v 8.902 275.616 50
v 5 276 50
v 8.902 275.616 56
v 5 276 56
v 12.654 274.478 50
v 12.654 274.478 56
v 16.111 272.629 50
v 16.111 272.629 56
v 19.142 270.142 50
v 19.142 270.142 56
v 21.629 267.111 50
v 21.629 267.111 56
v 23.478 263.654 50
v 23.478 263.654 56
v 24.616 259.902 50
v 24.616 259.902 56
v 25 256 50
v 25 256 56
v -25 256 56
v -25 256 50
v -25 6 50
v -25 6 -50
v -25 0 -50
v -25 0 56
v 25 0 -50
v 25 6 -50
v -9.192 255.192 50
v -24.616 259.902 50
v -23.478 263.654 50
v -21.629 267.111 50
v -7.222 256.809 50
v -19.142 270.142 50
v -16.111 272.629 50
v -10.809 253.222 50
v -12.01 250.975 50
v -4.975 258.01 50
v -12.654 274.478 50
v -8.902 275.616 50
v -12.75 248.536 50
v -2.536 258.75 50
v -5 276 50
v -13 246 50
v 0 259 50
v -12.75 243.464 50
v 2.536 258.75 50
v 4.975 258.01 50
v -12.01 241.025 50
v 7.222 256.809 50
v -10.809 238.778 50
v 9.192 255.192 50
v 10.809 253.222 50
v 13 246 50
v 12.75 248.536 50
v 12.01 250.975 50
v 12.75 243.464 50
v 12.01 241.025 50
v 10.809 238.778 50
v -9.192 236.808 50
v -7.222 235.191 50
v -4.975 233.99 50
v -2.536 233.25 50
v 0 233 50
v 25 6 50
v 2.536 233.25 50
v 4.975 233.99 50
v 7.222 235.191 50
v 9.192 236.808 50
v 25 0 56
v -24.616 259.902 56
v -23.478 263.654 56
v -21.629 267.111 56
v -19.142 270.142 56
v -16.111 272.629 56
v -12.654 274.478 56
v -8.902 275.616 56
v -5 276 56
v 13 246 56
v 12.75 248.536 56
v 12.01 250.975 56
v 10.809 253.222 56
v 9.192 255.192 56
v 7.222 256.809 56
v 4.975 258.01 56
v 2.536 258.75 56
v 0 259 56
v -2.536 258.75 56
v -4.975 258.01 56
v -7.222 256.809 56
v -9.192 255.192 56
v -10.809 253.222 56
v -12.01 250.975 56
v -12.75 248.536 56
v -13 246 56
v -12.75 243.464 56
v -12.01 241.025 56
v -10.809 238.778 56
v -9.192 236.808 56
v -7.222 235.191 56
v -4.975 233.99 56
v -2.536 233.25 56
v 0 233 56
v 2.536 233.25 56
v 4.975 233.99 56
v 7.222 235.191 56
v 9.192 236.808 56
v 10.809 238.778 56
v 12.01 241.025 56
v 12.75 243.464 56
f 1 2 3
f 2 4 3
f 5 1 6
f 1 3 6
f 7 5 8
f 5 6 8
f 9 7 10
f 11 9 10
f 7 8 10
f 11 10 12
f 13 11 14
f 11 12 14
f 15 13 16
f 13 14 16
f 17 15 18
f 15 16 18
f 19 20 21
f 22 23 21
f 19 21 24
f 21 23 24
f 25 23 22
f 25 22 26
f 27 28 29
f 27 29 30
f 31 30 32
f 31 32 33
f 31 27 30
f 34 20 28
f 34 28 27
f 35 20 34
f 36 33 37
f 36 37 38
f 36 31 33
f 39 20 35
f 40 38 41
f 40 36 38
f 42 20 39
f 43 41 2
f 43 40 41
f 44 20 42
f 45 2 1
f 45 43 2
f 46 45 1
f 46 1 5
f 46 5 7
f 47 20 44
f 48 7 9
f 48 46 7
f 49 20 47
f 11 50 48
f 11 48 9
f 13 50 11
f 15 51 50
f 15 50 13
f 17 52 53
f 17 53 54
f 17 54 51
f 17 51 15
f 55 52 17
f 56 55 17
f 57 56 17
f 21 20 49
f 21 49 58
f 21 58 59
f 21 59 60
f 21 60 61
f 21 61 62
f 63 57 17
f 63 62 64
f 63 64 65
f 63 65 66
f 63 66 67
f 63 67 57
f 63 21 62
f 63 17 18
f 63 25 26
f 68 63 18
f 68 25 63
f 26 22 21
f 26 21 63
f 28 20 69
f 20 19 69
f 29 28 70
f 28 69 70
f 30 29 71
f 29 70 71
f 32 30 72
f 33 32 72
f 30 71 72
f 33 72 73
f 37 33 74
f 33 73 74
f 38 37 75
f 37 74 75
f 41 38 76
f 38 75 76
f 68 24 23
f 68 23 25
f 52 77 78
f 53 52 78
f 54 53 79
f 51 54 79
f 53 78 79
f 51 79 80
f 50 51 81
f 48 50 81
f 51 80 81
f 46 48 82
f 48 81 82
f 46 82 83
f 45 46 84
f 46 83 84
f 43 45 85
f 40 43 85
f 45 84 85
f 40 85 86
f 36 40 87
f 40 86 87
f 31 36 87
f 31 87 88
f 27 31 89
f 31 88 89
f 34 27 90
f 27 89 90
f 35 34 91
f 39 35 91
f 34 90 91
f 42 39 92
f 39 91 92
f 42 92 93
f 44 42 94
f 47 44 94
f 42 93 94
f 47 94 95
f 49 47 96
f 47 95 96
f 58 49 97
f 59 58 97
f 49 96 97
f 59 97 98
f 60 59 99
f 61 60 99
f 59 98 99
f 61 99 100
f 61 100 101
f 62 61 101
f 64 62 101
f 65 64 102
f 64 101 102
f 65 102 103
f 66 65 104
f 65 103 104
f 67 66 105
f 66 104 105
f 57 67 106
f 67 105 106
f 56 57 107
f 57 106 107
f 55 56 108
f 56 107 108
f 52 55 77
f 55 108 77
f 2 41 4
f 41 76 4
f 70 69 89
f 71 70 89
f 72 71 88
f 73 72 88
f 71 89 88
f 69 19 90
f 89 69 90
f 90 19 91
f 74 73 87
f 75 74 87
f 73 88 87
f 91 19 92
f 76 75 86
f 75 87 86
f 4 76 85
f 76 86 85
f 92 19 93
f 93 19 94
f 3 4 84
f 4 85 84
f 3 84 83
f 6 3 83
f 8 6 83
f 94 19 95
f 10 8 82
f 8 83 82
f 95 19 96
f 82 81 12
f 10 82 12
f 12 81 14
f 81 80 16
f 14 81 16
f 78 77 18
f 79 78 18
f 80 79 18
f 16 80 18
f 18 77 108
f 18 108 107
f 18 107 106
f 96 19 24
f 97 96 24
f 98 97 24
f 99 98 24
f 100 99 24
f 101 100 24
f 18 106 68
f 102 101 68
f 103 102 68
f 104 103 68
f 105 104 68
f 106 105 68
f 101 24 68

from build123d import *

# Parameters (mm, degrees)
CROQUIS1_W              = 50
CROQUIS1_H              = 100
SALIENTE_EXTRUIR1_DEPTH = 6
CROQUIS2_W              = 50
CROQUIS2_H              = 6
SALIENTE_EXTRUIR2_DEPTH = 276
CROQUIS3_R              = 13
CORTAR_EXTRUIR1_DEPTH   = 6
REDONDEO1_R             = 20


with BuildPart() as part:
    # Croquis1 → Saliente-Extruir1 (new body)
    with BuildSketch(Plane(origin=(0, 0, 0), x_dir=(1, 0, 0), z_dir=(0, 1, 0))):
        Rectangle(CROQUIS1_W, CROQUIS1_H)
    extrude(amount=SALIENTE_EXTRUIR1_DEPTH)

    # Croquis2 → Saliente-Extruir2 (add)
    with BuildSketch(Plane.XZ):
        with Locations((0, 53)):
            Rectangle(CROQUIS2_W, CROQUIS2_H)
    extrude(amount=-SALIENTE_EXTRUIR2_DEPTH)

    # Croquis3 → Cortar-Extruir1 (cut)
    with BuildSketch(Plane.XY.offset(56)):
        with Locations((0, 246)):
            Circle(CROQUIS3_R)
    extrude(amount=-CORTAR_EXTRUIR1_DEPTH, mode=Mode.SUBTRACT)

    # Redondeo1
    redondeo1_edges = [part.edges().sort_by_distance(p)[0] for p in [
        (25, 276, 53),
        (-25, 276, 53),
    ]]
    fillet(redondeo1_edges, radius=REDONDEO1_R)


solid = part.part
